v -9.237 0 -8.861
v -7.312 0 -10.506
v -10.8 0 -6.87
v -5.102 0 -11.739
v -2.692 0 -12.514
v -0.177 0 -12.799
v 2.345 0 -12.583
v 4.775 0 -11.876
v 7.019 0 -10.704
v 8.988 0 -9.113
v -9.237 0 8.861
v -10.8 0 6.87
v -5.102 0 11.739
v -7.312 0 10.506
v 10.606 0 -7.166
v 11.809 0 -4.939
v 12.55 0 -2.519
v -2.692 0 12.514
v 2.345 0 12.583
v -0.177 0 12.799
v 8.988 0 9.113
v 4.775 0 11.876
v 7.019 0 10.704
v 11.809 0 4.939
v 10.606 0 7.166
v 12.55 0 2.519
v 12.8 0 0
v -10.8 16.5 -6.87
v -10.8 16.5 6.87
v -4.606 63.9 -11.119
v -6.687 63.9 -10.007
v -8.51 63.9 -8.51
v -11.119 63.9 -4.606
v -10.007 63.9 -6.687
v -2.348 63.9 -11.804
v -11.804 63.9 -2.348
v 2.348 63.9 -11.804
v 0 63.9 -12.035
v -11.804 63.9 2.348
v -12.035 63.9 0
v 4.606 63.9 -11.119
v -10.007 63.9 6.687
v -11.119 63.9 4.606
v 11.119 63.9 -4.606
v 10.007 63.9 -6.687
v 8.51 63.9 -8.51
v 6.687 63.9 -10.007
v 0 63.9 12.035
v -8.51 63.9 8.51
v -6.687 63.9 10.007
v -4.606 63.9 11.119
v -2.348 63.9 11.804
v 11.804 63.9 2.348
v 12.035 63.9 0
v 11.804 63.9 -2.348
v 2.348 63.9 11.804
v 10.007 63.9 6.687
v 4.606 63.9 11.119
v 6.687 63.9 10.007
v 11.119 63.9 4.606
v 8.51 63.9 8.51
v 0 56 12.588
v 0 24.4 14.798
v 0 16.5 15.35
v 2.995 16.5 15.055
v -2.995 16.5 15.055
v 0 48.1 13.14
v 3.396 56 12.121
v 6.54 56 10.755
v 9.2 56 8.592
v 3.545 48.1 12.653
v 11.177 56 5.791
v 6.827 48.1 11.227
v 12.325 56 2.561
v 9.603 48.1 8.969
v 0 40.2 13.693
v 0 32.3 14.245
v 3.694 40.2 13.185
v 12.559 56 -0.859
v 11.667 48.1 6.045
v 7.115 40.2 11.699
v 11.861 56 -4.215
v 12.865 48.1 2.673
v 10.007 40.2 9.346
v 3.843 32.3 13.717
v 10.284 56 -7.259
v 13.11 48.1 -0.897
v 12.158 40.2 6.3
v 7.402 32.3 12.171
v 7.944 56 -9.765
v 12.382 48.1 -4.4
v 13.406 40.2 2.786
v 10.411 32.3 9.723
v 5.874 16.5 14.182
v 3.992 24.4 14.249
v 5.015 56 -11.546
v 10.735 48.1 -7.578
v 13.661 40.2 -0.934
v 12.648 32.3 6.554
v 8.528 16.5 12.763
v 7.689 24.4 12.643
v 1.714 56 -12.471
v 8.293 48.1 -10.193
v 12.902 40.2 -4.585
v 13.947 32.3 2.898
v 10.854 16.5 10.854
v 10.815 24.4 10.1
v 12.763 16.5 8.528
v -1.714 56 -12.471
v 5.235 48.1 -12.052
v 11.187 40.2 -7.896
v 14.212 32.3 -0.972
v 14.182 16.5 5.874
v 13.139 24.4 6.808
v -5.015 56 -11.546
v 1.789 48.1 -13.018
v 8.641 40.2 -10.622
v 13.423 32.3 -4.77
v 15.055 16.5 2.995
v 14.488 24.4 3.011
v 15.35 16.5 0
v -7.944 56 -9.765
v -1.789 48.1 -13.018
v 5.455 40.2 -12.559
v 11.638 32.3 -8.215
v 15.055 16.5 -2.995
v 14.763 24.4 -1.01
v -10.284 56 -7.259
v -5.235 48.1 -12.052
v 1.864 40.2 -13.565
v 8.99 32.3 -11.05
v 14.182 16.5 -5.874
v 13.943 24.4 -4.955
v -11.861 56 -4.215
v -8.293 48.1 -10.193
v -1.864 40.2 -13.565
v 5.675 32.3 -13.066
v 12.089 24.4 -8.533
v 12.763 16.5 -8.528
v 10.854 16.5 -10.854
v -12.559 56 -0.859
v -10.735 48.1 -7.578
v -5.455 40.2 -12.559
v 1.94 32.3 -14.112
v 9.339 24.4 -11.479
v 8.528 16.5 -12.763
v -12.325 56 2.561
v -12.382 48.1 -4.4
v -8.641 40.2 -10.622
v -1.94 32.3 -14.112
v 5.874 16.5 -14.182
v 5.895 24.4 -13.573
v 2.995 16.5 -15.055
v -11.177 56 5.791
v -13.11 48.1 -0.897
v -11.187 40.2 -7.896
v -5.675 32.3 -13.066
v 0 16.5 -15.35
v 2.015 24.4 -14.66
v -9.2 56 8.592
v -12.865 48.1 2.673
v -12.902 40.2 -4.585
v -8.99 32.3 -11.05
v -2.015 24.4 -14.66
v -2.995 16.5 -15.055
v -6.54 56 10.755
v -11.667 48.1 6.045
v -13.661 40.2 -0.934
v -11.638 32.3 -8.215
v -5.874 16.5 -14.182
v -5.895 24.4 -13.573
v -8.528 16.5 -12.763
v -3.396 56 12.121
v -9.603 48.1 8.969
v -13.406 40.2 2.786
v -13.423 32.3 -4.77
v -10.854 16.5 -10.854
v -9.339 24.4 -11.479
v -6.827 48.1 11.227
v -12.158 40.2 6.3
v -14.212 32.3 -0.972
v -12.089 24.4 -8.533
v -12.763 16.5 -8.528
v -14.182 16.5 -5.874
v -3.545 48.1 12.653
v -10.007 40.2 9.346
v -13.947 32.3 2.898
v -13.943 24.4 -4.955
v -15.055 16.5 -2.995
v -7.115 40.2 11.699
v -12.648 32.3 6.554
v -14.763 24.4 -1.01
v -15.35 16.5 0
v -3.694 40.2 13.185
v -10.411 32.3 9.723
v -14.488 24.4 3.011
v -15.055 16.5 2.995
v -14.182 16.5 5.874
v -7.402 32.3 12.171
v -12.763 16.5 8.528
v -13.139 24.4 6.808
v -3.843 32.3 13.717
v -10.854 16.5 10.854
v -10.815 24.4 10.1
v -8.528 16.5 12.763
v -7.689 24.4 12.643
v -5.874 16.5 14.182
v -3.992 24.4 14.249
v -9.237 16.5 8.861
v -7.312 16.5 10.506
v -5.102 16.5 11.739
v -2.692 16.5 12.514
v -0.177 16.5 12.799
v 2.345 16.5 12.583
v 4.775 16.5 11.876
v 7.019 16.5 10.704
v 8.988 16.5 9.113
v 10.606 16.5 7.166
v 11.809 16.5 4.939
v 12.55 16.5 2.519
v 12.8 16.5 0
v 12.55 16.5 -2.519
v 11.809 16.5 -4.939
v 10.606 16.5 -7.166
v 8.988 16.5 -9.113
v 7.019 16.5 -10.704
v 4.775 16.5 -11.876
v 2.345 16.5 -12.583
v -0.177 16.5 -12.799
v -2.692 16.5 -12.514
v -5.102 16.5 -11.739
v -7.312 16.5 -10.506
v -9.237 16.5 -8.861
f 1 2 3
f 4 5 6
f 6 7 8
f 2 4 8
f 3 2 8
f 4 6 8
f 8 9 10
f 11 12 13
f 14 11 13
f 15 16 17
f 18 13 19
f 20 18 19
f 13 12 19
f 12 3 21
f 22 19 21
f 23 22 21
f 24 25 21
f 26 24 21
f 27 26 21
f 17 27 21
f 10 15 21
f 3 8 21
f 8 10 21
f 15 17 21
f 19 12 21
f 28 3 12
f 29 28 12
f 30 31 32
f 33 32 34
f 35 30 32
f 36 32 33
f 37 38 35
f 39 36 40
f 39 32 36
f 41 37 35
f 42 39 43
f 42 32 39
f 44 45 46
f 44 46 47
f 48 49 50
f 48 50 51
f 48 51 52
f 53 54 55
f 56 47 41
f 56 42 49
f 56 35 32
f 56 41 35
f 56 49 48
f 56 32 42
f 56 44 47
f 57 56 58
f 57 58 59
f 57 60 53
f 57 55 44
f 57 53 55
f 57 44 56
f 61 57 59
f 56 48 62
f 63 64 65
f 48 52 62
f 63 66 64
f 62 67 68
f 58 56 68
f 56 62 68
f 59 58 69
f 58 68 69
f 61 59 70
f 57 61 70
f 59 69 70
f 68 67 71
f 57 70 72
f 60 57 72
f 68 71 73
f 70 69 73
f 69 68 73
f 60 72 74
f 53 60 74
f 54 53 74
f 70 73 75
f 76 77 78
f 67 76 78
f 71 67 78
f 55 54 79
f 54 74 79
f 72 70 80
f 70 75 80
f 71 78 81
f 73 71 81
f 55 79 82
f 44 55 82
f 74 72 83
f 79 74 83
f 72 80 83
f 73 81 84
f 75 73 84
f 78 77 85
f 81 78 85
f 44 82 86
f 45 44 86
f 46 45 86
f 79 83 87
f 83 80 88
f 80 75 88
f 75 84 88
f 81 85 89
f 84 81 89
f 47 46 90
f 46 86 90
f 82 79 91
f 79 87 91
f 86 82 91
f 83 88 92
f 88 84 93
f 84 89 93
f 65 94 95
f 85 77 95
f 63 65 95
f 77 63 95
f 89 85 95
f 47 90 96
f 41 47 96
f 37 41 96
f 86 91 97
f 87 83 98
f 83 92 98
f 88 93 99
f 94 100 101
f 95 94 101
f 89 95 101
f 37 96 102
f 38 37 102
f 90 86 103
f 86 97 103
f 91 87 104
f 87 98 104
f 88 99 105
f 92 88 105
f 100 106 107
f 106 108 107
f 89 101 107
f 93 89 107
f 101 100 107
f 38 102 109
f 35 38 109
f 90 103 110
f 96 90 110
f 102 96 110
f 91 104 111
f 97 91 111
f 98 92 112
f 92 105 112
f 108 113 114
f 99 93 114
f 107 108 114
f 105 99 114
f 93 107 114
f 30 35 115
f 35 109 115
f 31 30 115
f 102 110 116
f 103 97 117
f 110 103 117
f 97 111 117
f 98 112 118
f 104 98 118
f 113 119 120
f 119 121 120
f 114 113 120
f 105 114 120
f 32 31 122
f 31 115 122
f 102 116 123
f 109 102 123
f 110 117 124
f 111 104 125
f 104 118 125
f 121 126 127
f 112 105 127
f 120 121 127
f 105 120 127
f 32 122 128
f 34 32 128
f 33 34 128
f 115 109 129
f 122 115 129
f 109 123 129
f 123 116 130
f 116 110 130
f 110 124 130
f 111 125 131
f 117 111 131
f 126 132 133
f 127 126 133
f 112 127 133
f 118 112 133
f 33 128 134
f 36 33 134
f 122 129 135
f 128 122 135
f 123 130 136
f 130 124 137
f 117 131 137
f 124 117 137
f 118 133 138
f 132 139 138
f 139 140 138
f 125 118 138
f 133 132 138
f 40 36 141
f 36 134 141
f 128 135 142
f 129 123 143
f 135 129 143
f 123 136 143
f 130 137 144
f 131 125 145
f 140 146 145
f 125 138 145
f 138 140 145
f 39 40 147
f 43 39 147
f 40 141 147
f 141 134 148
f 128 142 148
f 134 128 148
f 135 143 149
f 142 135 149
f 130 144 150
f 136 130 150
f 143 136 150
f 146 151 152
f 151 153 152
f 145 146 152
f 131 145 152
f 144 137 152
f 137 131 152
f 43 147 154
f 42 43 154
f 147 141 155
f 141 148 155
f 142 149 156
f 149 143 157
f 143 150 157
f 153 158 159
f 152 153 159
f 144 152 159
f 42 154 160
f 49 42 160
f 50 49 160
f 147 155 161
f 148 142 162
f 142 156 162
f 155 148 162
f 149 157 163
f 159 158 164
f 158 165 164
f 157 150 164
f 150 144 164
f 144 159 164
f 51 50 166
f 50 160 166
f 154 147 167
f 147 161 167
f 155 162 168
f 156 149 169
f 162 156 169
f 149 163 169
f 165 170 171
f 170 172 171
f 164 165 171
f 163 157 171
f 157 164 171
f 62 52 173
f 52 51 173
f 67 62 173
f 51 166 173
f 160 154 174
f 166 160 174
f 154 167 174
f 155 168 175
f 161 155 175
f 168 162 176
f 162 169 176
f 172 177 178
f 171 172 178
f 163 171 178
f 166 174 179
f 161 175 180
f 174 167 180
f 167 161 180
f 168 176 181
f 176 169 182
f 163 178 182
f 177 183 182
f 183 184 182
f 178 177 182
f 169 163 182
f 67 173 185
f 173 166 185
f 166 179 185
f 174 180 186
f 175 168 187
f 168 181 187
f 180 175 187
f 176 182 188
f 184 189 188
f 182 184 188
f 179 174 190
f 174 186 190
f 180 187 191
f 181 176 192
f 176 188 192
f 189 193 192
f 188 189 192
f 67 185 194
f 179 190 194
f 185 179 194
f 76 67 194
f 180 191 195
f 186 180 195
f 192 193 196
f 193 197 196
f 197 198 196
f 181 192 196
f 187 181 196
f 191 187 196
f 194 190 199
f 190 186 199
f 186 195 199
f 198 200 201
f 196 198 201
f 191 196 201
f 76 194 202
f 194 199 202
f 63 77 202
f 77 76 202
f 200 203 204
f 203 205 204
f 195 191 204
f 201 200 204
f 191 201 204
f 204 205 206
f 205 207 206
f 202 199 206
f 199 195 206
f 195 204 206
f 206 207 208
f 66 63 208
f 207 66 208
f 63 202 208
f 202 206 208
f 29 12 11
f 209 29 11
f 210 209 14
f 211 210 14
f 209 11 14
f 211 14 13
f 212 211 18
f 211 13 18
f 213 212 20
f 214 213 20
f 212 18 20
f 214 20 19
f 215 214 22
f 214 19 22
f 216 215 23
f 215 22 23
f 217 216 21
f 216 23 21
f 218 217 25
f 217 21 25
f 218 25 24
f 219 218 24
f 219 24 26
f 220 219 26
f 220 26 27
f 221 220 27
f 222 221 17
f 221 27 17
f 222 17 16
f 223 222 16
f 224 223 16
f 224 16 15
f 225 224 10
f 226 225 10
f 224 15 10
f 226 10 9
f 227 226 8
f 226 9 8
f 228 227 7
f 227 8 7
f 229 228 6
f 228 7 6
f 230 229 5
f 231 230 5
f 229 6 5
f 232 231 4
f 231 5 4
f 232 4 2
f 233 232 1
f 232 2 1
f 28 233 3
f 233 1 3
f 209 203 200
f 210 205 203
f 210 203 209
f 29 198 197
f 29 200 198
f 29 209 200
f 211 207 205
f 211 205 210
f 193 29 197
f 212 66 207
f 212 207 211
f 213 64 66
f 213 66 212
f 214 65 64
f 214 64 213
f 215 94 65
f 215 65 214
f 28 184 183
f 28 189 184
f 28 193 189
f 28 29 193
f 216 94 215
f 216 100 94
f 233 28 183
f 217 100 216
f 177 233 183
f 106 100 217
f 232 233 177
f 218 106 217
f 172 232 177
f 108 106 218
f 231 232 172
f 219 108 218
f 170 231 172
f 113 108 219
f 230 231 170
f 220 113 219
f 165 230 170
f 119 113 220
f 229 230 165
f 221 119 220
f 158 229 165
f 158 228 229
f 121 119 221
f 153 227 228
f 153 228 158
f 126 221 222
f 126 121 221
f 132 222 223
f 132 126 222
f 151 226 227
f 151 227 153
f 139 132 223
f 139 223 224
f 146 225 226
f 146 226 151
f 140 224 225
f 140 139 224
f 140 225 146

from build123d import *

# Parameters (mm, degrees)
SKETCH1_R           = 15.35
BOSS_EXTRUDE1_DEPTH = 63.9
SKETCH2_R           = 15.35
CUT_EXTRUDE1_DEPTH  = 16.5
DRAFT3_ANGLE        = -4


with BuildPart() as part:
    # Sketch1 → Boss-Extrude1 (new body)
    with BuildSketch(Plane(origin=(0, 0, 0), x_dir=(1, 0, 0), z_dir=(0, 1, 0))):
        with Locations(Location((0, 0, 0), (0, 0, 270))):
            Circle(SKETCH1_R)
    extrude(amount=BOSS_EXTRUDE1_DEPTH)

    # Sketch2 → Cut-Extrude1 (cut)
    with BuildSketch(Plane.XZ):
        with Locations(Location((0, 0, 0), (0, 0, 270))):
            Circle(SKETCH2_R)
        with BuildLine():
            Line((-10.8, -6.870225615), (-10.8, 6.870225615))
            ThreePointArc((-10.8, 6.870225615), (12.8, 0), (-10.8, -6.870225615))
        make_face(mode=Mode.SUBTRACT)
    extrude(amount=-CUT_EXTRUDE1_DEPTH, mode=Mode.SUBTRACT)

    # Draft3
    draft3_faces = [part.faces().sort_by_distance(p)[0] for p in [
        (0, 40.2, -15.35),
    ]]
    draft(draft3_faces, Plane(origin=(0, 16.5, 0), x_dir=(0, 0, -1), z_dir=(0, -1, 0)), DRAFT3_ANGLE)


solid = part.part
